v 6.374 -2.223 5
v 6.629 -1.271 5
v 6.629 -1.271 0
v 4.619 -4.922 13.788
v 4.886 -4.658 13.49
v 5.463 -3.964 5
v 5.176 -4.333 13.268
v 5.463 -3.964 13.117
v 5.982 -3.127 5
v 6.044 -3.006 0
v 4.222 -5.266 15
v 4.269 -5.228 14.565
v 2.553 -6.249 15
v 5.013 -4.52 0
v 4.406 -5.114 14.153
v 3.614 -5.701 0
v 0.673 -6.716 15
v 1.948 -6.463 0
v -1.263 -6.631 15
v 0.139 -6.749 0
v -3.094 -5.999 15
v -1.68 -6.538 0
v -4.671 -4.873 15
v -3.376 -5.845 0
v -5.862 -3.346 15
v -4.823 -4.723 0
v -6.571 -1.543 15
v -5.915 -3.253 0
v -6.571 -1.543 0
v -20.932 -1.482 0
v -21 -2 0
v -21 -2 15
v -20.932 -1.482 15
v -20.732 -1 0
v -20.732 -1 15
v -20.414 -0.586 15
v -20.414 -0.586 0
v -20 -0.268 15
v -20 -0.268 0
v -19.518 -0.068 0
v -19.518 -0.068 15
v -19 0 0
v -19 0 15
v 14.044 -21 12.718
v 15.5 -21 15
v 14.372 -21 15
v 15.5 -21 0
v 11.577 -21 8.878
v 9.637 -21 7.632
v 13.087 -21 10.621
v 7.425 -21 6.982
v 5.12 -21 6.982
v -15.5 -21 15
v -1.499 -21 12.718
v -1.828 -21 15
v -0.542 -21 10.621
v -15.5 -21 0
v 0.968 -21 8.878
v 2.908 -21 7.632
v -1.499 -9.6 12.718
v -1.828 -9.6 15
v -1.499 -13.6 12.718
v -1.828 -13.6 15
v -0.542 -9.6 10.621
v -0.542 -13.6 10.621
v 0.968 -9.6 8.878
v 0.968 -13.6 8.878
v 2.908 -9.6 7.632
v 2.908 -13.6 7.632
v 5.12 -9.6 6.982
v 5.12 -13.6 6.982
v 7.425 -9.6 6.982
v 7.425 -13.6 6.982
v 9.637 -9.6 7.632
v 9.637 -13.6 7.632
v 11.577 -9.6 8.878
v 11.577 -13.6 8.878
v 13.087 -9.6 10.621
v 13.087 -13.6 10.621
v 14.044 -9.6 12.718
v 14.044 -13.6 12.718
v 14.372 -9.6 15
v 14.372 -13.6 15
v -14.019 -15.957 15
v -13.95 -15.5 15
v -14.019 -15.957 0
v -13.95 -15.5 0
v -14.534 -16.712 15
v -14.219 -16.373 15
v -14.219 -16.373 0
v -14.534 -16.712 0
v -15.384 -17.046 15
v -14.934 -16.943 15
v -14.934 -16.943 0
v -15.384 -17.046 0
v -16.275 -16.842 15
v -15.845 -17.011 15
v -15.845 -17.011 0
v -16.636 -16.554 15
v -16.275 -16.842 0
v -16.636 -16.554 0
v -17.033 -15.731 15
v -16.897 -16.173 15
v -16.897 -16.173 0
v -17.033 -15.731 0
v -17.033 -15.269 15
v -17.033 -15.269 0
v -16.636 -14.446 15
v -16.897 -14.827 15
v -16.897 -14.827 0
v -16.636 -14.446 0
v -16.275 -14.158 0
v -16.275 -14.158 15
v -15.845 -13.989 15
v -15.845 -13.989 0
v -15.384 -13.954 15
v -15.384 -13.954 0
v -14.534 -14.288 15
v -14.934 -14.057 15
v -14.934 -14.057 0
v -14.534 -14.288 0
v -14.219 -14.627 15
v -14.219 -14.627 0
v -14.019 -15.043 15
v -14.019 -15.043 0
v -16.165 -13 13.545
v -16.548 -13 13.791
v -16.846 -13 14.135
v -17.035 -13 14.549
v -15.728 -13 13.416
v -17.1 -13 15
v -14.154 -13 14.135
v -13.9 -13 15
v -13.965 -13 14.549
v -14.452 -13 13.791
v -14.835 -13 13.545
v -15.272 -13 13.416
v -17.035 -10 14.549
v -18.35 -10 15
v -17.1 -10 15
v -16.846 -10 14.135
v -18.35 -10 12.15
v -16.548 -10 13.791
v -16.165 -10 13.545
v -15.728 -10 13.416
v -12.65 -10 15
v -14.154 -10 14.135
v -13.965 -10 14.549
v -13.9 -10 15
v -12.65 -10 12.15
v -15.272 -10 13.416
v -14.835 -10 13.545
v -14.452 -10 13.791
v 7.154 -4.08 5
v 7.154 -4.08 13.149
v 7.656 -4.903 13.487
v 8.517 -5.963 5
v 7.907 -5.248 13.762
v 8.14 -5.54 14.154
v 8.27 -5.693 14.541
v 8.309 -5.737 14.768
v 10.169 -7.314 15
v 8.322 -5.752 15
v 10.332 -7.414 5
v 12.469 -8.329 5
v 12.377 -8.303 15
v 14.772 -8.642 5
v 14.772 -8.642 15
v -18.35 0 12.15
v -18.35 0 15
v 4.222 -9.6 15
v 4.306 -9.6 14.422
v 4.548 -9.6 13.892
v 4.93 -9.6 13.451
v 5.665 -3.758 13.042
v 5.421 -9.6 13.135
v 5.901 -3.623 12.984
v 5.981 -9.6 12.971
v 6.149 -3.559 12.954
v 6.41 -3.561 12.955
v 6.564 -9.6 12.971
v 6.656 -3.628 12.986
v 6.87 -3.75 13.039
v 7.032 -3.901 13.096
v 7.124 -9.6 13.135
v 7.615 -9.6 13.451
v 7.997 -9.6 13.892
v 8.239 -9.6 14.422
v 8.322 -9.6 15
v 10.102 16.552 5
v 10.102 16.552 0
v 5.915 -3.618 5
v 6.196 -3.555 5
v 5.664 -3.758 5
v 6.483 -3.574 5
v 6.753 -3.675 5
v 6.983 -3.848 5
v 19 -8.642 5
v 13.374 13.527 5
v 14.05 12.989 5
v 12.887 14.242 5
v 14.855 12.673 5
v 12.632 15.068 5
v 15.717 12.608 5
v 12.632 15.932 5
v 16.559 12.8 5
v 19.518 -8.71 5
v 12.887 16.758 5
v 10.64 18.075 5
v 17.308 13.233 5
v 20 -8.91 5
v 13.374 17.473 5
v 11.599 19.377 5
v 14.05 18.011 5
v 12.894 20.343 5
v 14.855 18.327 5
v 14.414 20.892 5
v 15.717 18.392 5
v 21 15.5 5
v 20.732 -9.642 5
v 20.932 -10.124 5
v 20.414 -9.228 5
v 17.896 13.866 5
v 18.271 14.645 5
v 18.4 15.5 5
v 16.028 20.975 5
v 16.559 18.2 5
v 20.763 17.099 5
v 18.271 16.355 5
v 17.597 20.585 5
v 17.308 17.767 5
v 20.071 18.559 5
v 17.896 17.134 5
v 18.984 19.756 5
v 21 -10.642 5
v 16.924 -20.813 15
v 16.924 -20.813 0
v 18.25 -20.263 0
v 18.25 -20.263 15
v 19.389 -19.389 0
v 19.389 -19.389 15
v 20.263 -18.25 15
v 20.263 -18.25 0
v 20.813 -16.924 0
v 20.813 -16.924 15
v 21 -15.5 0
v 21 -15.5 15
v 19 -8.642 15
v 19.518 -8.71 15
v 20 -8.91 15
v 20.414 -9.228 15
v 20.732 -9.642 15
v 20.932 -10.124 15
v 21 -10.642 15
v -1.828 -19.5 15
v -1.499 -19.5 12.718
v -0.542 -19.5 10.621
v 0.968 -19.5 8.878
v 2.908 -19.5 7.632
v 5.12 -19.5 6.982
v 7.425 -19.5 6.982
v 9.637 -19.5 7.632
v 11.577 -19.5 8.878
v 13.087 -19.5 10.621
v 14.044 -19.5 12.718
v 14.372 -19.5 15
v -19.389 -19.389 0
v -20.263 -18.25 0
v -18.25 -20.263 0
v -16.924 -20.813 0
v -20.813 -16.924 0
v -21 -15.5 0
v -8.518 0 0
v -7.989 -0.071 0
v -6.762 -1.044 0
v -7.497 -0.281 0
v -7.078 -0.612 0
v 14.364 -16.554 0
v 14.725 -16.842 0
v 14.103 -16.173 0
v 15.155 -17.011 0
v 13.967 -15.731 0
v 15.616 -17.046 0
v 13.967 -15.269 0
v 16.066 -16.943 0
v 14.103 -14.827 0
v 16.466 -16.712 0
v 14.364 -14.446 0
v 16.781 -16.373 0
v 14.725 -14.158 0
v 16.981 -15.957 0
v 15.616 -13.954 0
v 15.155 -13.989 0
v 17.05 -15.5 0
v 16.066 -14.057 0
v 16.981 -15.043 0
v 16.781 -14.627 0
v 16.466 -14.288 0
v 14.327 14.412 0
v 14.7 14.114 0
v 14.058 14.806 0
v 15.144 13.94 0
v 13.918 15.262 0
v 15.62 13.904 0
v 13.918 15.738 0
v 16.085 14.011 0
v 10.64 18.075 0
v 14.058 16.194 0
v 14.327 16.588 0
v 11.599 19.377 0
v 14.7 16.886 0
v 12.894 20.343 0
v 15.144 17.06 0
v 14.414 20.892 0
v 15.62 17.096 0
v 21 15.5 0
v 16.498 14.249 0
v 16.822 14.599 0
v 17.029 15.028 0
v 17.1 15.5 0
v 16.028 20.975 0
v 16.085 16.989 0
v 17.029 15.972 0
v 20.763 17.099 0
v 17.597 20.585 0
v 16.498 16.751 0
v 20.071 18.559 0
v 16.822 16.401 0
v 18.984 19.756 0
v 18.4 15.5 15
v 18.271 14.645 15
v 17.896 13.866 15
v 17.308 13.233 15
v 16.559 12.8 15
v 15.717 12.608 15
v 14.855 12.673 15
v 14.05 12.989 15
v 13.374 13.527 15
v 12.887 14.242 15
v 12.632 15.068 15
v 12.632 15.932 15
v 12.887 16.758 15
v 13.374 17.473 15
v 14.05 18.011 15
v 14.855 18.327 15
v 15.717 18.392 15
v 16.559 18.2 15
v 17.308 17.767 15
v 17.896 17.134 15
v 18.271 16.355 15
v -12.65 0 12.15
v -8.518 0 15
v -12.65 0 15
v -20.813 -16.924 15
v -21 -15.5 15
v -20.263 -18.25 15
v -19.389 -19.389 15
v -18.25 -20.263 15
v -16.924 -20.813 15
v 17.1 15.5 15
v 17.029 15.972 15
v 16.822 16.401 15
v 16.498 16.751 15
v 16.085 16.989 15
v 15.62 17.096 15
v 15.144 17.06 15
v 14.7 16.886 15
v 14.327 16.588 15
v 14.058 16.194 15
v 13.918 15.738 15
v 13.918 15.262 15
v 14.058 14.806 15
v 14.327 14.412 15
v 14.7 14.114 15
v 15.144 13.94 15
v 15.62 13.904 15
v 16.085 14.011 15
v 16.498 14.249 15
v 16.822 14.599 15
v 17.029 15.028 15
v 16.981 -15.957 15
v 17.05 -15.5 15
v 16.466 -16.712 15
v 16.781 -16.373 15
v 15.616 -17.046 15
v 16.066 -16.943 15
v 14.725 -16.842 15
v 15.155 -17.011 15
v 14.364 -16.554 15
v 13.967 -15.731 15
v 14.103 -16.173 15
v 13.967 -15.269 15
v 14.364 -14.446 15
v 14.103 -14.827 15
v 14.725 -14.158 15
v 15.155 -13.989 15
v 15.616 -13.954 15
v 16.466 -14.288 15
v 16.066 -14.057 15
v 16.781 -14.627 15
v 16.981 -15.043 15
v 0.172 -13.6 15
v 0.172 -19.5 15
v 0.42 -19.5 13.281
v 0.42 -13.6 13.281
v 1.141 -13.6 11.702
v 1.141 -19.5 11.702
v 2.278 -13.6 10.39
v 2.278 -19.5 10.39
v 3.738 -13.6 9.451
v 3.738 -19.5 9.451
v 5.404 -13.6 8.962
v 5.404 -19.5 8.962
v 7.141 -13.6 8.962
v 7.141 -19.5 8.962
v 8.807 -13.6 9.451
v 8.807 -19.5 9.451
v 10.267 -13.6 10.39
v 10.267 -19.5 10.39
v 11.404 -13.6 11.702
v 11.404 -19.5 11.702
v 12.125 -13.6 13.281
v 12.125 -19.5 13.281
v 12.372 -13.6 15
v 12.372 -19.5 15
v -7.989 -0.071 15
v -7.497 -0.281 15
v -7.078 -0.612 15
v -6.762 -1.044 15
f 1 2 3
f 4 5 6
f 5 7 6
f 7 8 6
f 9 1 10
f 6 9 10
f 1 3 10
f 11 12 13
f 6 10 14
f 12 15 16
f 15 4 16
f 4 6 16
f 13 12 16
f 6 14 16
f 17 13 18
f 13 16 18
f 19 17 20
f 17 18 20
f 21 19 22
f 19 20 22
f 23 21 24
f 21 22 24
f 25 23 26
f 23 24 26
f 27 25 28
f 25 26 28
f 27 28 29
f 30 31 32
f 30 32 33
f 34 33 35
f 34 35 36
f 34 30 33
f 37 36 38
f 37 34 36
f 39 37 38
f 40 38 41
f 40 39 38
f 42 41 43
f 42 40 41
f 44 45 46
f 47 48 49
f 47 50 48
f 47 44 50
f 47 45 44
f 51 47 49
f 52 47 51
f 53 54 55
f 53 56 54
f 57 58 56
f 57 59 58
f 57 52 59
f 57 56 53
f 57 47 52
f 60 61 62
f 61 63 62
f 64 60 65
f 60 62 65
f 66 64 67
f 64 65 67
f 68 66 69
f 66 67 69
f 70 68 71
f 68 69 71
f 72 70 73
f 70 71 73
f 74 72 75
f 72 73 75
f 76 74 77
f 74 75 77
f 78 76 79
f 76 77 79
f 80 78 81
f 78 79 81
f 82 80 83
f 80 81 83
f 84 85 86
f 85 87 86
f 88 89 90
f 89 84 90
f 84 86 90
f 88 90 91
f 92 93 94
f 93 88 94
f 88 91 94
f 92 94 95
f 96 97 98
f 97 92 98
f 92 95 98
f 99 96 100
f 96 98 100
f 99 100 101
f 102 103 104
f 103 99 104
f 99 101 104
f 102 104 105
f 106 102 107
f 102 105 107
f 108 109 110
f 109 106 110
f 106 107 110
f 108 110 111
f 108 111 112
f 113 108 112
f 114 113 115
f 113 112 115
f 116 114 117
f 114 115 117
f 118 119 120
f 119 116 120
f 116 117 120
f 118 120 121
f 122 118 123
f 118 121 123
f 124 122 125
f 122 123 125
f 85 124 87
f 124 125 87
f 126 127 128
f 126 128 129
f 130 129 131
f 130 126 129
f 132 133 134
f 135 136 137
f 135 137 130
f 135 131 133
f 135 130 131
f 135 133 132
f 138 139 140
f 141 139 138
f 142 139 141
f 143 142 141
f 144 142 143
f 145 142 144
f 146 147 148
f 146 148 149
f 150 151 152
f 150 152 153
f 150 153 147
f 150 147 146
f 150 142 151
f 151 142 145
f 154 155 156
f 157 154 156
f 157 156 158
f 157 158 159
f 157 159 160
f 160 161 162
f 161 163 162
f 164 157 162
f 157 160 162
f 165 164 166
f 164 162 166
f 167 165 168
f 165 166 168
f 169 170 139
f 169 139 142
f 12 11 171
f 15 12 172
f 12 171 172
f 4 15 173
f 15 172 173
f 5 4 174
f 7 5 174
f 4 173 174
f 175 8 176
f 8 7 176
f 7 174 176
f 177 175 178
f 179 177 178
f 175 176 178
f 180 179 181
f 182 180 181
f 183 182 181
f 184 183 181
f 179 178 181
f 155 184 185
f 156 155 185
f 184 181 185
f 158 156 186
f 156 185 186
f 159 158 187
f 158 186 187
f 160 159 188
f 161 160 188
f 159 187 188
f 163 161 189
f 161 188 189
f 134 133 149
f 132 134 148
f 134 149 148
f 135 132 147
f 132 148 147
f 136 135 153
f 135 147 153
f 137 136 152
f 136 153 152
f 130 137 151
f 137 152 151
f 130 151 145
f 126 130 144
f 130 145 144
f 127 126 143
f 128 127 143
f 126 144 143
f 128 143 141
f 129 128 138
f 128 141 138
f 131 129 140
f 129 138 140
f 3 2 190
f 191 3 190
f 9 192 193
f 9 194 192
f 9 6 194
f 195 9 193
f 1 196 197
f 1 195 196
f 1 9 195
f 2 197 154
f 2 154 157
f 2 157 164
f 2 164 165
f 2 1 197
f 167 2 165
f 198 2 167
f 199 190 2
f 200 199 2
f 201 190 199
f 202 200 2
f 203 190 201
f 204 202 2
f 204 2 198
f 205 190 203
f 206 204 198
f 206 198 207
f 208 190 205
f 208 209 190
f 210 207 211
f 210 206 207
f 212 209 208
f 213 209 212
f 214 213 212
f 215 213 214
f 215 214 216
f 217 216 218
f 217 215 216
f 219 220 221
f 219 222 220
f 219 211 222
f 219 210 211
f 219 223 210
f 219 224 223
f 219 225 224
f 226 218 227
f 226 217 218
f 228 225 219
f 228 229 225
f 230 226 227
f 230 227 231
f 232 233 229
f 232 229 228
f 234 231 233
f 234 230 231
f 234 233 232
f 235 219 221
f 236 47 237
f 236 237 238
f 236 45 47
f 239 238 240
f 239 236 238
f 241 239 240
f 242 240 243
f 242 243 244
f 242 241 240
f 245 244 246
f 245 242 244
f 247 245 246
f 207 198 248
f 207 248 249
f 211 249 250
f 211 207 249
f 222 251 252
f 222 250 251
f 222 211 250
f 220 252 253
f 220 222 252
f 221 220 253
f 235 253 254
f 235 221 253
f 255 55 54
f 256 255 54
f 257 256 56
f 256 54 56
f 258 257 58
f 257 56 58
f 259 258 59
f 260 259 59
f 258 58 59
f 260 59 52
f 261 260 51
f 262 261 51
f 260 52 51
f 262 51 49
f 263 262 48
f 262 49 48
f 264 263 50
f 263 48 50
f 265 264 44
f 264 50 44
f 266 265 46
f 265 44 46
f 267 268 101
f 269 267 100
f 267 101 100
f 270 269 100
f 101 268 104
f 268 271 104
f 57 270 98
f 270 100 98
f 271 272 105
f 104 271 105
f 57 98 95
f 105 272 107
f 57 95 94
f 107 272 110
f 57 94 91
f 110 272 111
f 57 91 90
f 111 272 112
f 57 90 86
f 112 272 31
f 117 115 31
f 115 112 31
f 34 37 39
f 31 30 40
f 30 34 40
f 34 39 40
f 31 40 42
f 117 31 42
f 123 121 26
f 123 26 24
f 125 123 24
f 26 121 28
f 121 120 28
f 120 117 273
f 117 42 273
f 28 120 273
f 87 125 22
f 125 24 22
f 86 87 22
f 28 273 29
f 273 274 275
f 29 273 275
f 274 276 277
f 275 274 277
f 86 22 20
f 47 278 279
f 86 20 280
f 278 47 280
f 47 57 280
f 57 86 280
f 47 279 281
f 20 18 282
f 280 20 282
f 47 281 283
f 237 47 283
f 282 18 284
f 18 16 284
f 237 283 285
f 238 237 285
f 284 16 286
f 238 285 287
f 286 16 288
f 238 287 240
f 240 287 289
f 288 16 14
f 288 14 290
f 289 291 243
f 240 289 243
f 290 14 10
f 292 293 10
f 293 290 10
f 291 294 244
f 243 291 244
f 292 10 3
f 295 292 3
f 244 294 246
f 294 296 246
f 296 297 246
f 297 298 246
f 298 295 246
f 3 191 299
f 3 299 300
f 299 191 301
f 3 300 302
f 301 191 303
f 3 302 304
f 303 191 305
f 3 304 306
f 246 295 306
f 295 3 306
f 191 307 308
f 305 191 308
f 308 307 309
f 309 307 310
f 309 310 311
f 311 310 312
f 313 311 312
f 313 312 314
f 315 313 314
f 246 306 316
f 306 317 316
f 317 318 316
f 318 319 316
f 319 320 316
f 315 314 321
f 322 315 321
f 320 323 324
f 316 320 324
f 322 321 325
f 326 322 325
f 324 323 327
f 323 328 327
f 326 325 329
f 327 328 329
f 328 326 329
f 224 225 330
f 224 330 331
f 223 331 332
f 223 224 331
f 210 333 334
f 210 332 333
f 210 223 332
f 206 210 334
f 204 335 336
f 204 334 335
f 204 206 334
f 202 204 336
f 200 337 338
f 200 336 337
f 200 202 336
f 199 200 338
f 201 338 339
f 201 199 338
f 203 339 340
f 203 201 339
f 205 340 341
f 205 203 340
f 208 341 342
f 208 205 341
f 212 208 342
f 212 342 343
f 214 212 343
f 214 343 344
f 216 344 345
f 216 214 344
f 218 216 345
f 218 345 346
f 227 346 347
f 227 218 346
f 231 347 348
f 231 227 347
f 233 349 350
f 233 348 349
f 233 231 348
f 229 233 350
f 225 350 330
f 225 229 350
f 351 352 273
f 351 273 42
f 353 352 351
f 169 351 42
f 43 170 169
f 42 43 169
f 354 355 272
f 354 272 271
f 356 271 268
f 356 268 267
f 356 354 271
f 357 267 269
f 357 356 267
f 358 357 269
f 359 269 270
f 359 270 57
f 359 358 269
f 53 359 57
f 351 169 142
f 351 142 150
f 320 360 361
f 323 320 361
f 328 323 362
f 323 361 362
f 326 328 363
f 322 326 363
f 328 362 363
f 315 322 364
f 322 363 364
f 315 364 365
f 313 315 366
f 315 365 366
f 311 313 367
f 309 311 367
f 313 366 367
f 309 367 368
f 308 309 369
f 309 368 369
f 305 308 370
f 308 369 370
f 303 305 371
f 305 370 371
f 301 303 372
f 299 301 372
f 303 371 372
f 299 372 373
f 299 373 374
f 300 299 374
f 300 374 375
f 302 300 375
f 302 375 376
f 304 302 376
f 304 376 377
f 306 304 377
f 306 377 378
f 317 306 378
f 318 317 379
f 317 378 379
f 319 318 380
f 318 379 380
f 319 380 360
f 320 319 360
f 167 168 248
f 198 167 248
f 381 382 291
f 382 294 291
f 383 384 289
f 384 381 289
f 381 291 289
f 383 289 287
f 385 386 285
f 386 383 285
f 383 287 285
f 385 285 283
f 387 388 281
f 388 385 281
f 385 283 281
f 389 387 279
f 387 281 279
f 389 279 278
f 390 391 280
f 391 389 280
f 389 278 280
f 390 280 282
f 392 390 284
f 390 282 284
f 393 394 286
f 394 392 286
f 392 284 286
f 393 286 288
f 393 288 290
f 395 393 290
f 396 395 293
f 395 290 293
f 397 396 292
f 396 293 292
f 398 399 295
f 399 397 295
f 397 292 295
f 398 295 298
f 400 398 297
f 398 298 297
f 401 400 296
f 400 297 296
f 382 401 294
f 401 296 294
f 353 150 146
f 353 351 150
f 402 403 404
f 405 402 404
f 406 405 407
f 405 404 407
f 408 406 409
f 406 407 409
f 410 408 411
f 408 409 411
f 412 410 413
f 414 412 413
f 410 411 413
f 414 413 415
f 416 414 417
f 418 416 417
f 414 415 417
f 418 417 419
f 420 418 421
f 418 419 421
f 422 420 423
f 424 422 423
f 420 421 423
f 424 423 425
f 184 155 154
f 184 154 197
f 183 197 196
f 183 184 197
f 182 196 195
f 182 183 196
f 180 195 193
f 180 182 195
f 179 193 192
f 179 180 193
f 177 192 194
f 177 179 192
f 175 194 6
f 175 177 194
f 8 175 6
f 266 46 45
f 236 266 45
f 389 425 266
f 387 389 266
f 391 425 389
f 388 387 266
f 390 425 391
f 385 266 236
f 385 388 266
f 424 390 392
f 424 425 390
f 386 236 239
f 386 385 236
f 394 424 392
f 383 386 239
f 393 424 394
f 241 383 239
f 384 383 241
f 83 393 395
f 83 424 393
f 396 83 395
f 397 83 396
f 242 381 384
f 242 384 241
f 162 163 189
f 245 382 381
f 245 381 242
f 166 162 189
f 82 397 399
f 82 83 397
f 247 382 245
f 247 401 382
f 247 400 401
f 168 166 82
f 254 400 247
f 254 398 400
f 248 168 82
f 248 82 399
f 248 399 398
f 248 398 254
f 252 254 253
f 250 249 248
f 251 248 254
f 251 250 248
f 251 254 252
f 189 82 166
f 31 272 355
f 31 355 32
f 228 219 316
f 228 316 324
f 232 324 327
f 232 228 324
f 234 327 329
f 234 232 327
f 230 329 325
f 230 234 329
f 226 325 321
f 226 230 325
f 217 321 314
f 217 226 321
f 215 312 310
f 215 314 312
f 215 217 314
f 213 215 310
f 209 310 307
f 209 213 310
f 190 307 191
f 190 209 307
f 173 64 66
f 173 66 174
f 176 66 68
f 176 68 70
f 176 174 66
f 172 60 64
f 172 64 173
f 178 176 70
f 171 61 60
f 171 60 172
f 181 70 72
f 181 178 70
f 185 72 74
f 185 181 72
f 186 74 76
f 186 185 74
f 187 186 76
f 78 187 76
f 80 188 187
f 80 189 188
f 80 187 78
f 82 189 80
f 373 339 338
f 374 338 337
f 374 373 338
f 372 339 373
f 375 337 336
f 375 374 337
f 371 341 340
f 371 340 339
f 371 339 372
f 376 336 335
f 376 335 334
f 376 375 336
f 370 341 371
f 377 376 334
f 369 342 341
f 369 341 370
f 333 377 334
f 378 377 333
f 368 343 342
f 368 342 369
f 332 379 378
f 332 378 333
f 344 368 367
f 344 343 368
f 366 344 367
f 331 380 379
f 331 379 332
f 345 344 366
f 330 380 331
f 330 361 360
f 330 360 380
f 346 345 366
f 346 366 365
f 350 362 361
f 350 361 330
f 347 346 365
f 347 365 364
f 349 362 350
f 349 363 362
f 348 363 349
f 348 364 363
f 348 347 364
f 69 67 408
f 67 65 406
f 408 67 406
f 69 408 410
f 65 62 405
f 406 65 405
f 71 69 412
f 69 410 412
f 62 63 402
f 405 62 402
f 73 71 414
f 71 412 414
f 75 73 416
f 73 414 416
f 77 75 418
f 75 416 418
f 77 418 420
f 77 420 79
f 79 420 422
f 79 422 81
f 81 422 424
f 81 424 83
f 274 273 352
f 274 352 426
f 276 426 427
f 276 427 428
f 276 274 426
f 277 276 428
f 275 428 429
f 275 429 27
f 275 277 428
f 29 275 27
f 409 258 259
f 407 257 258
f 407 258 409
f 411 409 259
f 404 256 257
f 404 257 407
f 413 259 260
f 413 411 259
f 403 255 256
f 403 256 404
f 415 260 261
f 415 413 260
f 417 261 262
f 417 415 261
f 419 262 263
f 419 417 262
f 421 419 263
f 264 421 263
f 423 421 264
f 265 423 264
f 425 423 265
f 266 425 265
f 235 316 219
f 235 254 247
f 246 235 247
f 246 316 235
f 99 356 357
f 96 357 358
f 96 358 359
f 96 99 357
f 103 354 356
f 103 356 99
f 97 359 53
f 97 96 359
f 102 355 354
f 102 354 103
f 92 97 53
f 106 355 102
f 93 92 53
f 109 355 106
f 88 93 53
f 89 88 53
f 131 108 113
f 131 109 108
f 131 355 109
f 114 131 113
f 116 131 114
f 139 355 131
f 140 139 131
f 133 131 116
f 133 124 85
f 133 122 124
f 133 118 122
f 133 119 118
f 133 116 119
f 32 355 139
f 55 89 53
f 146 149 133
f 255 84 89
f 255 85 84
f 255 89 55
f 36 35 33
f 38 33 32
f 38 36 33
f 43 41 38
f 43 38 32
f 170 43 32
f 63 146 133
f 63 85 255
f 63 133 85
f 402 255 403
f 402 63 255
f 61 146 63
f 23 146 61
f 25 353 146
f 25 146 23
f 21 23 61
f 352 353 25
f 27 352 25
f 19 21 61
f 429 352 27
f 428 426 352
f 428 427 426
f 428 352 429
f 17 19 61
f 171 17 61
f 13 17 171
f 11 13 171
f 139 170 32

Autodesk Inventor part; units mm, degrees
ref_plane "YZ Plane" through (0, 0, 0) normal (1, 0, 0) x (0, 1, 0)
ref_plane "XZ Plane" through (0, 0, 0) normal (0, 1, 0) x (-1, 0, 0)
ref_plane "XY Plane" through (0, 0, 0) normal (0, 0, 1) x (1, 0, 0)
sketch "Sketch1" plane through (0, 0, 0) normal (0, 0, 1) x (1, 0, 0)
  line L0 (-15.5, 15.5) -> (15.5, 15.5) construction
  line L1 (15.5, 15.5) -> (15.5, -15.5) construction
  line L2 (15.5, -15.5) -> (-15.5, -15.5) construction
  line L3 (-15.5, -15.5) -> (-15.5, 15.5) construction
  circle A0 centre (0, 0) radius 6.75
  line L4 (-21, -21) -> (-21, 21)
  line L5 (-21, 21) -> (21, 21)
  line L6 (21, 21) -> (21, -21)
  line L7 (21, -21) -> (-21, -21)
  circle A1 centre (-15.5, -15.5) radius 1.55
  circle A2 centre (15.5, -15.5) radius 1.55
  dimension "d0" = 13.5
  dimension "d2" = 31
  dimension "d3" = 42
  dimension "d4" = 3.1
extrude "Extrusion1" add sketch "Sketch1" along normal blind 15
sketch "Sketch2" plane through (0, 0, 15) normal (0, 0, 1) x (1, 0, 0)
  circle A0 centre (0, 0) radius 6.75 projected
  line L0 (-21, 21) -> (-21, -21) projected
  line L1 (21, -21) -> (21, 21) projected
  line L2 (21, 21) -> (-21, 21) projected
  circle A1 centre (0, 0) radius 5.3975
  circle A2 centre (6.2725, 0) radius 0.875
  circle A3 centre (14.7725, 0) radius 7.625
  line L3 (6.2725, 0) -> (6.2725, -2.4936)
  arc A4 (7.1541, -4.0797) -> (5.4631, -3.9644) centre (6.2725, -4.5517) ccw
  arc A5 (7.1541, -4.0797) -> (14.7725, -8.642) centre (14.7725, 0) ccw
  arc A6 (21, 5.9919) -> (6.4006, -2.1436) centre (14.7725, 0) ccw
  line L4 (14.7725, -8.642) -> (21, -8.642)
  line L5 (-6.75, 0) -> (-21, 0)
  dimension "d7" = 10.795
  dimension "d9" = 8.5
  dimension "d11" = 1.75
  dimension "d12" = 2
extrude "Extrusion2" cut sketch "Sketch2" against normal blind 10 contours L5 L0 L2 L1 A6 A0 | A0 A2 A3 L1 L4 A5 A4 | A6 L1 A3 A2 A0 | A2 A0 | A3 L1 picked at (15.7085, -1.9503)
sketch "Sketch3" plane through (-21, -21, 0) normal (0, -1, 0) x (1, 0, 0)
  line L0 (0, 15) -> (42, 15) projected
  circle A0 centre (27.2725, 15) radius 6.1
  point P0 (21, 0)
  dimension "d15" = 6.2725
  dimension "d16" = 12.2
extrude "Extrusion3" cut sketch "Sketch3" against normal blind 7.4
sketch "Sketch4" plane through (-21, -13.6, 0) normal (0, -1, 0) x (1, 0, 0)
  arc A0 (21.1725, 15) -> (33.3725, 15) centre (27.2725, 15) ccw projected
  circle A1 centre (27.2725, 15) radius 8.1
  point P0 (21, 0)
  dimension "d19" = 16.2
extrude "Extrusion4" cut sketch "Sketch4" against normal blind 4
sketch "Sketch5" plane through (-21, -21, 0) normal (0, -1, 0) x (1, 0, 0)
  arc A0 (21.1725, 15) -> (33.3725, 15) centre (27.2725, 15) ccw projected
  circle A1 centre (27.2725, 15) radius 8.1
  point P0 (21, 0)
  dimension "d24" = 16.2
extrude "Extrusion5" cut sketch "Sketch5" against normal blind 1.5
sketch "Sketch6" plane through (-21, -9.6, 0) normal (0, -1, 0) x (1, 0, 0)
  arc A0 (19.1725, 15) -> (35.3725, 15) centre (27.2725, 15) ccw projected
  circle A1 centre (27.2725, 15) radius 2.05
  point P0 (21, 0)
  dimension "d29" = 4.1
extrude "Extrusion6" cut sketch "Sketch6" against normal through all
sketch "Sketch7" plane through (0, 0, 5) normal (0, 0, 1) x (1, 0, 0)
  line L0 (-21, 0) -> (-21, 21) projected
  line L1 (-6.75, 0) -> (-21, 0) projected
  arc A0 (5.4631, -3.9644) -> (-6.75, 0) centre (0, 0) ccw projected
  arc A1 (7.1541, -4.0797) -> (5.4631, -3.9644) centre (6.2725, -4.5517) ccw projected
  arc A2 (7.1541, -4.0797) -> (14.7725, -8.642) centre (14.7725, 0) ccw projected
  line L2 (21, -8.642) -> (14.7725, -8.642) projected
  line L3 (21, 21) -> (21, -8.642) projected
  line L4 (-21, 21) -> (21, 21) projected
  line L5 (6.6254, -1.2908) -> (10.1015, 16.5517)
  arc A3 (21, 15.5) -> (10.1015, 16.5517) centre (15.5, 15.5) ccw
  circle A4 centre (15.5, -15.5) radius 1.55 projected
  circle A5 centre (15.5, 15.5) radius 3
  dimension "d33" = 31
  dimension "d34" = 6
extrude "Extrusion7" cut sketch "Sketch7" against normal through all contours L0 L4 A3 L5 A0 L1 | L4 L3 A3
sketch "Sketch8" plane through (-21, 0, 15) normal (0, 1, 0) x (1, 0, 0)
  line L0 (14.25, 0) -> (0, 0) projected
  line L1 (2.65, 2.85) -> (8.35, 2.85)
  line L2 (8.35, 2.85) -> (8.35, -2.85)
  line L3 (8.35, -2.85) -> (2.65, -2.85)
  line L4 (2.65, -2.85) -> (2.65, 2.85)
  point P0 (21, 15)
  point P1 (5.5, 0)
  dimension "d37" = 5.7
  dimension "d38" = 15.5
extrude "Extrusion8" cut sketch "Sketch8" against normal blind 10
sketch "Sketch9" plane through (-21, -10, 15) normal (0, 1, 0) x (1, 0, 0)
  line L0 (8.35, 0) -> (2.65, 0) projected
  circle A0 centre (5.5, 0) radius 1.6
  point P0 (21, 15)
  dimension "d41" = 3.2
extrude "Extrusion9" cut sketch "Sketch9" against normal blind 3
fillet "Fillet1" radius 5.5 2 edges at (-21, -21, 7.5) (21, -21, 7.5)
fillet "Fillet2" radius 2 3 edges at (-21, 0, 7.5) (-6.75, 0, 7.5) (21, -8.642, 10)
sketch "Sketch10" plane through (0, 0, 5) normal (0, 0, 1) x (1, 0, 0)
  arc A0 (21, 15.5) -> (10.1015, 16.5517) centre (15.5, 15.5) ccw projected
  circle A1 centre (15.5, 15.5) radius 2.9
  dimension "d47" = 5.8
extrude "Extrusion10" add sketch "Sketch10" along normal blind 10
sketch "Sketch11" plane through (15.5, 15.5, 15) normal (0, 0, 1) x (1, 0, 0)
  circle A0 centre (0, 0) radius 2.9 projected
  circle A1 centre (0, 0) radius 1.6
  point P0 (-15.5, -15.5)
  dimension "d52" = 3.2
extrude "Extrusion11" cut sketch "Sketch11" against normal through all contours A1
properties part number "EXTRUDER BODY"
